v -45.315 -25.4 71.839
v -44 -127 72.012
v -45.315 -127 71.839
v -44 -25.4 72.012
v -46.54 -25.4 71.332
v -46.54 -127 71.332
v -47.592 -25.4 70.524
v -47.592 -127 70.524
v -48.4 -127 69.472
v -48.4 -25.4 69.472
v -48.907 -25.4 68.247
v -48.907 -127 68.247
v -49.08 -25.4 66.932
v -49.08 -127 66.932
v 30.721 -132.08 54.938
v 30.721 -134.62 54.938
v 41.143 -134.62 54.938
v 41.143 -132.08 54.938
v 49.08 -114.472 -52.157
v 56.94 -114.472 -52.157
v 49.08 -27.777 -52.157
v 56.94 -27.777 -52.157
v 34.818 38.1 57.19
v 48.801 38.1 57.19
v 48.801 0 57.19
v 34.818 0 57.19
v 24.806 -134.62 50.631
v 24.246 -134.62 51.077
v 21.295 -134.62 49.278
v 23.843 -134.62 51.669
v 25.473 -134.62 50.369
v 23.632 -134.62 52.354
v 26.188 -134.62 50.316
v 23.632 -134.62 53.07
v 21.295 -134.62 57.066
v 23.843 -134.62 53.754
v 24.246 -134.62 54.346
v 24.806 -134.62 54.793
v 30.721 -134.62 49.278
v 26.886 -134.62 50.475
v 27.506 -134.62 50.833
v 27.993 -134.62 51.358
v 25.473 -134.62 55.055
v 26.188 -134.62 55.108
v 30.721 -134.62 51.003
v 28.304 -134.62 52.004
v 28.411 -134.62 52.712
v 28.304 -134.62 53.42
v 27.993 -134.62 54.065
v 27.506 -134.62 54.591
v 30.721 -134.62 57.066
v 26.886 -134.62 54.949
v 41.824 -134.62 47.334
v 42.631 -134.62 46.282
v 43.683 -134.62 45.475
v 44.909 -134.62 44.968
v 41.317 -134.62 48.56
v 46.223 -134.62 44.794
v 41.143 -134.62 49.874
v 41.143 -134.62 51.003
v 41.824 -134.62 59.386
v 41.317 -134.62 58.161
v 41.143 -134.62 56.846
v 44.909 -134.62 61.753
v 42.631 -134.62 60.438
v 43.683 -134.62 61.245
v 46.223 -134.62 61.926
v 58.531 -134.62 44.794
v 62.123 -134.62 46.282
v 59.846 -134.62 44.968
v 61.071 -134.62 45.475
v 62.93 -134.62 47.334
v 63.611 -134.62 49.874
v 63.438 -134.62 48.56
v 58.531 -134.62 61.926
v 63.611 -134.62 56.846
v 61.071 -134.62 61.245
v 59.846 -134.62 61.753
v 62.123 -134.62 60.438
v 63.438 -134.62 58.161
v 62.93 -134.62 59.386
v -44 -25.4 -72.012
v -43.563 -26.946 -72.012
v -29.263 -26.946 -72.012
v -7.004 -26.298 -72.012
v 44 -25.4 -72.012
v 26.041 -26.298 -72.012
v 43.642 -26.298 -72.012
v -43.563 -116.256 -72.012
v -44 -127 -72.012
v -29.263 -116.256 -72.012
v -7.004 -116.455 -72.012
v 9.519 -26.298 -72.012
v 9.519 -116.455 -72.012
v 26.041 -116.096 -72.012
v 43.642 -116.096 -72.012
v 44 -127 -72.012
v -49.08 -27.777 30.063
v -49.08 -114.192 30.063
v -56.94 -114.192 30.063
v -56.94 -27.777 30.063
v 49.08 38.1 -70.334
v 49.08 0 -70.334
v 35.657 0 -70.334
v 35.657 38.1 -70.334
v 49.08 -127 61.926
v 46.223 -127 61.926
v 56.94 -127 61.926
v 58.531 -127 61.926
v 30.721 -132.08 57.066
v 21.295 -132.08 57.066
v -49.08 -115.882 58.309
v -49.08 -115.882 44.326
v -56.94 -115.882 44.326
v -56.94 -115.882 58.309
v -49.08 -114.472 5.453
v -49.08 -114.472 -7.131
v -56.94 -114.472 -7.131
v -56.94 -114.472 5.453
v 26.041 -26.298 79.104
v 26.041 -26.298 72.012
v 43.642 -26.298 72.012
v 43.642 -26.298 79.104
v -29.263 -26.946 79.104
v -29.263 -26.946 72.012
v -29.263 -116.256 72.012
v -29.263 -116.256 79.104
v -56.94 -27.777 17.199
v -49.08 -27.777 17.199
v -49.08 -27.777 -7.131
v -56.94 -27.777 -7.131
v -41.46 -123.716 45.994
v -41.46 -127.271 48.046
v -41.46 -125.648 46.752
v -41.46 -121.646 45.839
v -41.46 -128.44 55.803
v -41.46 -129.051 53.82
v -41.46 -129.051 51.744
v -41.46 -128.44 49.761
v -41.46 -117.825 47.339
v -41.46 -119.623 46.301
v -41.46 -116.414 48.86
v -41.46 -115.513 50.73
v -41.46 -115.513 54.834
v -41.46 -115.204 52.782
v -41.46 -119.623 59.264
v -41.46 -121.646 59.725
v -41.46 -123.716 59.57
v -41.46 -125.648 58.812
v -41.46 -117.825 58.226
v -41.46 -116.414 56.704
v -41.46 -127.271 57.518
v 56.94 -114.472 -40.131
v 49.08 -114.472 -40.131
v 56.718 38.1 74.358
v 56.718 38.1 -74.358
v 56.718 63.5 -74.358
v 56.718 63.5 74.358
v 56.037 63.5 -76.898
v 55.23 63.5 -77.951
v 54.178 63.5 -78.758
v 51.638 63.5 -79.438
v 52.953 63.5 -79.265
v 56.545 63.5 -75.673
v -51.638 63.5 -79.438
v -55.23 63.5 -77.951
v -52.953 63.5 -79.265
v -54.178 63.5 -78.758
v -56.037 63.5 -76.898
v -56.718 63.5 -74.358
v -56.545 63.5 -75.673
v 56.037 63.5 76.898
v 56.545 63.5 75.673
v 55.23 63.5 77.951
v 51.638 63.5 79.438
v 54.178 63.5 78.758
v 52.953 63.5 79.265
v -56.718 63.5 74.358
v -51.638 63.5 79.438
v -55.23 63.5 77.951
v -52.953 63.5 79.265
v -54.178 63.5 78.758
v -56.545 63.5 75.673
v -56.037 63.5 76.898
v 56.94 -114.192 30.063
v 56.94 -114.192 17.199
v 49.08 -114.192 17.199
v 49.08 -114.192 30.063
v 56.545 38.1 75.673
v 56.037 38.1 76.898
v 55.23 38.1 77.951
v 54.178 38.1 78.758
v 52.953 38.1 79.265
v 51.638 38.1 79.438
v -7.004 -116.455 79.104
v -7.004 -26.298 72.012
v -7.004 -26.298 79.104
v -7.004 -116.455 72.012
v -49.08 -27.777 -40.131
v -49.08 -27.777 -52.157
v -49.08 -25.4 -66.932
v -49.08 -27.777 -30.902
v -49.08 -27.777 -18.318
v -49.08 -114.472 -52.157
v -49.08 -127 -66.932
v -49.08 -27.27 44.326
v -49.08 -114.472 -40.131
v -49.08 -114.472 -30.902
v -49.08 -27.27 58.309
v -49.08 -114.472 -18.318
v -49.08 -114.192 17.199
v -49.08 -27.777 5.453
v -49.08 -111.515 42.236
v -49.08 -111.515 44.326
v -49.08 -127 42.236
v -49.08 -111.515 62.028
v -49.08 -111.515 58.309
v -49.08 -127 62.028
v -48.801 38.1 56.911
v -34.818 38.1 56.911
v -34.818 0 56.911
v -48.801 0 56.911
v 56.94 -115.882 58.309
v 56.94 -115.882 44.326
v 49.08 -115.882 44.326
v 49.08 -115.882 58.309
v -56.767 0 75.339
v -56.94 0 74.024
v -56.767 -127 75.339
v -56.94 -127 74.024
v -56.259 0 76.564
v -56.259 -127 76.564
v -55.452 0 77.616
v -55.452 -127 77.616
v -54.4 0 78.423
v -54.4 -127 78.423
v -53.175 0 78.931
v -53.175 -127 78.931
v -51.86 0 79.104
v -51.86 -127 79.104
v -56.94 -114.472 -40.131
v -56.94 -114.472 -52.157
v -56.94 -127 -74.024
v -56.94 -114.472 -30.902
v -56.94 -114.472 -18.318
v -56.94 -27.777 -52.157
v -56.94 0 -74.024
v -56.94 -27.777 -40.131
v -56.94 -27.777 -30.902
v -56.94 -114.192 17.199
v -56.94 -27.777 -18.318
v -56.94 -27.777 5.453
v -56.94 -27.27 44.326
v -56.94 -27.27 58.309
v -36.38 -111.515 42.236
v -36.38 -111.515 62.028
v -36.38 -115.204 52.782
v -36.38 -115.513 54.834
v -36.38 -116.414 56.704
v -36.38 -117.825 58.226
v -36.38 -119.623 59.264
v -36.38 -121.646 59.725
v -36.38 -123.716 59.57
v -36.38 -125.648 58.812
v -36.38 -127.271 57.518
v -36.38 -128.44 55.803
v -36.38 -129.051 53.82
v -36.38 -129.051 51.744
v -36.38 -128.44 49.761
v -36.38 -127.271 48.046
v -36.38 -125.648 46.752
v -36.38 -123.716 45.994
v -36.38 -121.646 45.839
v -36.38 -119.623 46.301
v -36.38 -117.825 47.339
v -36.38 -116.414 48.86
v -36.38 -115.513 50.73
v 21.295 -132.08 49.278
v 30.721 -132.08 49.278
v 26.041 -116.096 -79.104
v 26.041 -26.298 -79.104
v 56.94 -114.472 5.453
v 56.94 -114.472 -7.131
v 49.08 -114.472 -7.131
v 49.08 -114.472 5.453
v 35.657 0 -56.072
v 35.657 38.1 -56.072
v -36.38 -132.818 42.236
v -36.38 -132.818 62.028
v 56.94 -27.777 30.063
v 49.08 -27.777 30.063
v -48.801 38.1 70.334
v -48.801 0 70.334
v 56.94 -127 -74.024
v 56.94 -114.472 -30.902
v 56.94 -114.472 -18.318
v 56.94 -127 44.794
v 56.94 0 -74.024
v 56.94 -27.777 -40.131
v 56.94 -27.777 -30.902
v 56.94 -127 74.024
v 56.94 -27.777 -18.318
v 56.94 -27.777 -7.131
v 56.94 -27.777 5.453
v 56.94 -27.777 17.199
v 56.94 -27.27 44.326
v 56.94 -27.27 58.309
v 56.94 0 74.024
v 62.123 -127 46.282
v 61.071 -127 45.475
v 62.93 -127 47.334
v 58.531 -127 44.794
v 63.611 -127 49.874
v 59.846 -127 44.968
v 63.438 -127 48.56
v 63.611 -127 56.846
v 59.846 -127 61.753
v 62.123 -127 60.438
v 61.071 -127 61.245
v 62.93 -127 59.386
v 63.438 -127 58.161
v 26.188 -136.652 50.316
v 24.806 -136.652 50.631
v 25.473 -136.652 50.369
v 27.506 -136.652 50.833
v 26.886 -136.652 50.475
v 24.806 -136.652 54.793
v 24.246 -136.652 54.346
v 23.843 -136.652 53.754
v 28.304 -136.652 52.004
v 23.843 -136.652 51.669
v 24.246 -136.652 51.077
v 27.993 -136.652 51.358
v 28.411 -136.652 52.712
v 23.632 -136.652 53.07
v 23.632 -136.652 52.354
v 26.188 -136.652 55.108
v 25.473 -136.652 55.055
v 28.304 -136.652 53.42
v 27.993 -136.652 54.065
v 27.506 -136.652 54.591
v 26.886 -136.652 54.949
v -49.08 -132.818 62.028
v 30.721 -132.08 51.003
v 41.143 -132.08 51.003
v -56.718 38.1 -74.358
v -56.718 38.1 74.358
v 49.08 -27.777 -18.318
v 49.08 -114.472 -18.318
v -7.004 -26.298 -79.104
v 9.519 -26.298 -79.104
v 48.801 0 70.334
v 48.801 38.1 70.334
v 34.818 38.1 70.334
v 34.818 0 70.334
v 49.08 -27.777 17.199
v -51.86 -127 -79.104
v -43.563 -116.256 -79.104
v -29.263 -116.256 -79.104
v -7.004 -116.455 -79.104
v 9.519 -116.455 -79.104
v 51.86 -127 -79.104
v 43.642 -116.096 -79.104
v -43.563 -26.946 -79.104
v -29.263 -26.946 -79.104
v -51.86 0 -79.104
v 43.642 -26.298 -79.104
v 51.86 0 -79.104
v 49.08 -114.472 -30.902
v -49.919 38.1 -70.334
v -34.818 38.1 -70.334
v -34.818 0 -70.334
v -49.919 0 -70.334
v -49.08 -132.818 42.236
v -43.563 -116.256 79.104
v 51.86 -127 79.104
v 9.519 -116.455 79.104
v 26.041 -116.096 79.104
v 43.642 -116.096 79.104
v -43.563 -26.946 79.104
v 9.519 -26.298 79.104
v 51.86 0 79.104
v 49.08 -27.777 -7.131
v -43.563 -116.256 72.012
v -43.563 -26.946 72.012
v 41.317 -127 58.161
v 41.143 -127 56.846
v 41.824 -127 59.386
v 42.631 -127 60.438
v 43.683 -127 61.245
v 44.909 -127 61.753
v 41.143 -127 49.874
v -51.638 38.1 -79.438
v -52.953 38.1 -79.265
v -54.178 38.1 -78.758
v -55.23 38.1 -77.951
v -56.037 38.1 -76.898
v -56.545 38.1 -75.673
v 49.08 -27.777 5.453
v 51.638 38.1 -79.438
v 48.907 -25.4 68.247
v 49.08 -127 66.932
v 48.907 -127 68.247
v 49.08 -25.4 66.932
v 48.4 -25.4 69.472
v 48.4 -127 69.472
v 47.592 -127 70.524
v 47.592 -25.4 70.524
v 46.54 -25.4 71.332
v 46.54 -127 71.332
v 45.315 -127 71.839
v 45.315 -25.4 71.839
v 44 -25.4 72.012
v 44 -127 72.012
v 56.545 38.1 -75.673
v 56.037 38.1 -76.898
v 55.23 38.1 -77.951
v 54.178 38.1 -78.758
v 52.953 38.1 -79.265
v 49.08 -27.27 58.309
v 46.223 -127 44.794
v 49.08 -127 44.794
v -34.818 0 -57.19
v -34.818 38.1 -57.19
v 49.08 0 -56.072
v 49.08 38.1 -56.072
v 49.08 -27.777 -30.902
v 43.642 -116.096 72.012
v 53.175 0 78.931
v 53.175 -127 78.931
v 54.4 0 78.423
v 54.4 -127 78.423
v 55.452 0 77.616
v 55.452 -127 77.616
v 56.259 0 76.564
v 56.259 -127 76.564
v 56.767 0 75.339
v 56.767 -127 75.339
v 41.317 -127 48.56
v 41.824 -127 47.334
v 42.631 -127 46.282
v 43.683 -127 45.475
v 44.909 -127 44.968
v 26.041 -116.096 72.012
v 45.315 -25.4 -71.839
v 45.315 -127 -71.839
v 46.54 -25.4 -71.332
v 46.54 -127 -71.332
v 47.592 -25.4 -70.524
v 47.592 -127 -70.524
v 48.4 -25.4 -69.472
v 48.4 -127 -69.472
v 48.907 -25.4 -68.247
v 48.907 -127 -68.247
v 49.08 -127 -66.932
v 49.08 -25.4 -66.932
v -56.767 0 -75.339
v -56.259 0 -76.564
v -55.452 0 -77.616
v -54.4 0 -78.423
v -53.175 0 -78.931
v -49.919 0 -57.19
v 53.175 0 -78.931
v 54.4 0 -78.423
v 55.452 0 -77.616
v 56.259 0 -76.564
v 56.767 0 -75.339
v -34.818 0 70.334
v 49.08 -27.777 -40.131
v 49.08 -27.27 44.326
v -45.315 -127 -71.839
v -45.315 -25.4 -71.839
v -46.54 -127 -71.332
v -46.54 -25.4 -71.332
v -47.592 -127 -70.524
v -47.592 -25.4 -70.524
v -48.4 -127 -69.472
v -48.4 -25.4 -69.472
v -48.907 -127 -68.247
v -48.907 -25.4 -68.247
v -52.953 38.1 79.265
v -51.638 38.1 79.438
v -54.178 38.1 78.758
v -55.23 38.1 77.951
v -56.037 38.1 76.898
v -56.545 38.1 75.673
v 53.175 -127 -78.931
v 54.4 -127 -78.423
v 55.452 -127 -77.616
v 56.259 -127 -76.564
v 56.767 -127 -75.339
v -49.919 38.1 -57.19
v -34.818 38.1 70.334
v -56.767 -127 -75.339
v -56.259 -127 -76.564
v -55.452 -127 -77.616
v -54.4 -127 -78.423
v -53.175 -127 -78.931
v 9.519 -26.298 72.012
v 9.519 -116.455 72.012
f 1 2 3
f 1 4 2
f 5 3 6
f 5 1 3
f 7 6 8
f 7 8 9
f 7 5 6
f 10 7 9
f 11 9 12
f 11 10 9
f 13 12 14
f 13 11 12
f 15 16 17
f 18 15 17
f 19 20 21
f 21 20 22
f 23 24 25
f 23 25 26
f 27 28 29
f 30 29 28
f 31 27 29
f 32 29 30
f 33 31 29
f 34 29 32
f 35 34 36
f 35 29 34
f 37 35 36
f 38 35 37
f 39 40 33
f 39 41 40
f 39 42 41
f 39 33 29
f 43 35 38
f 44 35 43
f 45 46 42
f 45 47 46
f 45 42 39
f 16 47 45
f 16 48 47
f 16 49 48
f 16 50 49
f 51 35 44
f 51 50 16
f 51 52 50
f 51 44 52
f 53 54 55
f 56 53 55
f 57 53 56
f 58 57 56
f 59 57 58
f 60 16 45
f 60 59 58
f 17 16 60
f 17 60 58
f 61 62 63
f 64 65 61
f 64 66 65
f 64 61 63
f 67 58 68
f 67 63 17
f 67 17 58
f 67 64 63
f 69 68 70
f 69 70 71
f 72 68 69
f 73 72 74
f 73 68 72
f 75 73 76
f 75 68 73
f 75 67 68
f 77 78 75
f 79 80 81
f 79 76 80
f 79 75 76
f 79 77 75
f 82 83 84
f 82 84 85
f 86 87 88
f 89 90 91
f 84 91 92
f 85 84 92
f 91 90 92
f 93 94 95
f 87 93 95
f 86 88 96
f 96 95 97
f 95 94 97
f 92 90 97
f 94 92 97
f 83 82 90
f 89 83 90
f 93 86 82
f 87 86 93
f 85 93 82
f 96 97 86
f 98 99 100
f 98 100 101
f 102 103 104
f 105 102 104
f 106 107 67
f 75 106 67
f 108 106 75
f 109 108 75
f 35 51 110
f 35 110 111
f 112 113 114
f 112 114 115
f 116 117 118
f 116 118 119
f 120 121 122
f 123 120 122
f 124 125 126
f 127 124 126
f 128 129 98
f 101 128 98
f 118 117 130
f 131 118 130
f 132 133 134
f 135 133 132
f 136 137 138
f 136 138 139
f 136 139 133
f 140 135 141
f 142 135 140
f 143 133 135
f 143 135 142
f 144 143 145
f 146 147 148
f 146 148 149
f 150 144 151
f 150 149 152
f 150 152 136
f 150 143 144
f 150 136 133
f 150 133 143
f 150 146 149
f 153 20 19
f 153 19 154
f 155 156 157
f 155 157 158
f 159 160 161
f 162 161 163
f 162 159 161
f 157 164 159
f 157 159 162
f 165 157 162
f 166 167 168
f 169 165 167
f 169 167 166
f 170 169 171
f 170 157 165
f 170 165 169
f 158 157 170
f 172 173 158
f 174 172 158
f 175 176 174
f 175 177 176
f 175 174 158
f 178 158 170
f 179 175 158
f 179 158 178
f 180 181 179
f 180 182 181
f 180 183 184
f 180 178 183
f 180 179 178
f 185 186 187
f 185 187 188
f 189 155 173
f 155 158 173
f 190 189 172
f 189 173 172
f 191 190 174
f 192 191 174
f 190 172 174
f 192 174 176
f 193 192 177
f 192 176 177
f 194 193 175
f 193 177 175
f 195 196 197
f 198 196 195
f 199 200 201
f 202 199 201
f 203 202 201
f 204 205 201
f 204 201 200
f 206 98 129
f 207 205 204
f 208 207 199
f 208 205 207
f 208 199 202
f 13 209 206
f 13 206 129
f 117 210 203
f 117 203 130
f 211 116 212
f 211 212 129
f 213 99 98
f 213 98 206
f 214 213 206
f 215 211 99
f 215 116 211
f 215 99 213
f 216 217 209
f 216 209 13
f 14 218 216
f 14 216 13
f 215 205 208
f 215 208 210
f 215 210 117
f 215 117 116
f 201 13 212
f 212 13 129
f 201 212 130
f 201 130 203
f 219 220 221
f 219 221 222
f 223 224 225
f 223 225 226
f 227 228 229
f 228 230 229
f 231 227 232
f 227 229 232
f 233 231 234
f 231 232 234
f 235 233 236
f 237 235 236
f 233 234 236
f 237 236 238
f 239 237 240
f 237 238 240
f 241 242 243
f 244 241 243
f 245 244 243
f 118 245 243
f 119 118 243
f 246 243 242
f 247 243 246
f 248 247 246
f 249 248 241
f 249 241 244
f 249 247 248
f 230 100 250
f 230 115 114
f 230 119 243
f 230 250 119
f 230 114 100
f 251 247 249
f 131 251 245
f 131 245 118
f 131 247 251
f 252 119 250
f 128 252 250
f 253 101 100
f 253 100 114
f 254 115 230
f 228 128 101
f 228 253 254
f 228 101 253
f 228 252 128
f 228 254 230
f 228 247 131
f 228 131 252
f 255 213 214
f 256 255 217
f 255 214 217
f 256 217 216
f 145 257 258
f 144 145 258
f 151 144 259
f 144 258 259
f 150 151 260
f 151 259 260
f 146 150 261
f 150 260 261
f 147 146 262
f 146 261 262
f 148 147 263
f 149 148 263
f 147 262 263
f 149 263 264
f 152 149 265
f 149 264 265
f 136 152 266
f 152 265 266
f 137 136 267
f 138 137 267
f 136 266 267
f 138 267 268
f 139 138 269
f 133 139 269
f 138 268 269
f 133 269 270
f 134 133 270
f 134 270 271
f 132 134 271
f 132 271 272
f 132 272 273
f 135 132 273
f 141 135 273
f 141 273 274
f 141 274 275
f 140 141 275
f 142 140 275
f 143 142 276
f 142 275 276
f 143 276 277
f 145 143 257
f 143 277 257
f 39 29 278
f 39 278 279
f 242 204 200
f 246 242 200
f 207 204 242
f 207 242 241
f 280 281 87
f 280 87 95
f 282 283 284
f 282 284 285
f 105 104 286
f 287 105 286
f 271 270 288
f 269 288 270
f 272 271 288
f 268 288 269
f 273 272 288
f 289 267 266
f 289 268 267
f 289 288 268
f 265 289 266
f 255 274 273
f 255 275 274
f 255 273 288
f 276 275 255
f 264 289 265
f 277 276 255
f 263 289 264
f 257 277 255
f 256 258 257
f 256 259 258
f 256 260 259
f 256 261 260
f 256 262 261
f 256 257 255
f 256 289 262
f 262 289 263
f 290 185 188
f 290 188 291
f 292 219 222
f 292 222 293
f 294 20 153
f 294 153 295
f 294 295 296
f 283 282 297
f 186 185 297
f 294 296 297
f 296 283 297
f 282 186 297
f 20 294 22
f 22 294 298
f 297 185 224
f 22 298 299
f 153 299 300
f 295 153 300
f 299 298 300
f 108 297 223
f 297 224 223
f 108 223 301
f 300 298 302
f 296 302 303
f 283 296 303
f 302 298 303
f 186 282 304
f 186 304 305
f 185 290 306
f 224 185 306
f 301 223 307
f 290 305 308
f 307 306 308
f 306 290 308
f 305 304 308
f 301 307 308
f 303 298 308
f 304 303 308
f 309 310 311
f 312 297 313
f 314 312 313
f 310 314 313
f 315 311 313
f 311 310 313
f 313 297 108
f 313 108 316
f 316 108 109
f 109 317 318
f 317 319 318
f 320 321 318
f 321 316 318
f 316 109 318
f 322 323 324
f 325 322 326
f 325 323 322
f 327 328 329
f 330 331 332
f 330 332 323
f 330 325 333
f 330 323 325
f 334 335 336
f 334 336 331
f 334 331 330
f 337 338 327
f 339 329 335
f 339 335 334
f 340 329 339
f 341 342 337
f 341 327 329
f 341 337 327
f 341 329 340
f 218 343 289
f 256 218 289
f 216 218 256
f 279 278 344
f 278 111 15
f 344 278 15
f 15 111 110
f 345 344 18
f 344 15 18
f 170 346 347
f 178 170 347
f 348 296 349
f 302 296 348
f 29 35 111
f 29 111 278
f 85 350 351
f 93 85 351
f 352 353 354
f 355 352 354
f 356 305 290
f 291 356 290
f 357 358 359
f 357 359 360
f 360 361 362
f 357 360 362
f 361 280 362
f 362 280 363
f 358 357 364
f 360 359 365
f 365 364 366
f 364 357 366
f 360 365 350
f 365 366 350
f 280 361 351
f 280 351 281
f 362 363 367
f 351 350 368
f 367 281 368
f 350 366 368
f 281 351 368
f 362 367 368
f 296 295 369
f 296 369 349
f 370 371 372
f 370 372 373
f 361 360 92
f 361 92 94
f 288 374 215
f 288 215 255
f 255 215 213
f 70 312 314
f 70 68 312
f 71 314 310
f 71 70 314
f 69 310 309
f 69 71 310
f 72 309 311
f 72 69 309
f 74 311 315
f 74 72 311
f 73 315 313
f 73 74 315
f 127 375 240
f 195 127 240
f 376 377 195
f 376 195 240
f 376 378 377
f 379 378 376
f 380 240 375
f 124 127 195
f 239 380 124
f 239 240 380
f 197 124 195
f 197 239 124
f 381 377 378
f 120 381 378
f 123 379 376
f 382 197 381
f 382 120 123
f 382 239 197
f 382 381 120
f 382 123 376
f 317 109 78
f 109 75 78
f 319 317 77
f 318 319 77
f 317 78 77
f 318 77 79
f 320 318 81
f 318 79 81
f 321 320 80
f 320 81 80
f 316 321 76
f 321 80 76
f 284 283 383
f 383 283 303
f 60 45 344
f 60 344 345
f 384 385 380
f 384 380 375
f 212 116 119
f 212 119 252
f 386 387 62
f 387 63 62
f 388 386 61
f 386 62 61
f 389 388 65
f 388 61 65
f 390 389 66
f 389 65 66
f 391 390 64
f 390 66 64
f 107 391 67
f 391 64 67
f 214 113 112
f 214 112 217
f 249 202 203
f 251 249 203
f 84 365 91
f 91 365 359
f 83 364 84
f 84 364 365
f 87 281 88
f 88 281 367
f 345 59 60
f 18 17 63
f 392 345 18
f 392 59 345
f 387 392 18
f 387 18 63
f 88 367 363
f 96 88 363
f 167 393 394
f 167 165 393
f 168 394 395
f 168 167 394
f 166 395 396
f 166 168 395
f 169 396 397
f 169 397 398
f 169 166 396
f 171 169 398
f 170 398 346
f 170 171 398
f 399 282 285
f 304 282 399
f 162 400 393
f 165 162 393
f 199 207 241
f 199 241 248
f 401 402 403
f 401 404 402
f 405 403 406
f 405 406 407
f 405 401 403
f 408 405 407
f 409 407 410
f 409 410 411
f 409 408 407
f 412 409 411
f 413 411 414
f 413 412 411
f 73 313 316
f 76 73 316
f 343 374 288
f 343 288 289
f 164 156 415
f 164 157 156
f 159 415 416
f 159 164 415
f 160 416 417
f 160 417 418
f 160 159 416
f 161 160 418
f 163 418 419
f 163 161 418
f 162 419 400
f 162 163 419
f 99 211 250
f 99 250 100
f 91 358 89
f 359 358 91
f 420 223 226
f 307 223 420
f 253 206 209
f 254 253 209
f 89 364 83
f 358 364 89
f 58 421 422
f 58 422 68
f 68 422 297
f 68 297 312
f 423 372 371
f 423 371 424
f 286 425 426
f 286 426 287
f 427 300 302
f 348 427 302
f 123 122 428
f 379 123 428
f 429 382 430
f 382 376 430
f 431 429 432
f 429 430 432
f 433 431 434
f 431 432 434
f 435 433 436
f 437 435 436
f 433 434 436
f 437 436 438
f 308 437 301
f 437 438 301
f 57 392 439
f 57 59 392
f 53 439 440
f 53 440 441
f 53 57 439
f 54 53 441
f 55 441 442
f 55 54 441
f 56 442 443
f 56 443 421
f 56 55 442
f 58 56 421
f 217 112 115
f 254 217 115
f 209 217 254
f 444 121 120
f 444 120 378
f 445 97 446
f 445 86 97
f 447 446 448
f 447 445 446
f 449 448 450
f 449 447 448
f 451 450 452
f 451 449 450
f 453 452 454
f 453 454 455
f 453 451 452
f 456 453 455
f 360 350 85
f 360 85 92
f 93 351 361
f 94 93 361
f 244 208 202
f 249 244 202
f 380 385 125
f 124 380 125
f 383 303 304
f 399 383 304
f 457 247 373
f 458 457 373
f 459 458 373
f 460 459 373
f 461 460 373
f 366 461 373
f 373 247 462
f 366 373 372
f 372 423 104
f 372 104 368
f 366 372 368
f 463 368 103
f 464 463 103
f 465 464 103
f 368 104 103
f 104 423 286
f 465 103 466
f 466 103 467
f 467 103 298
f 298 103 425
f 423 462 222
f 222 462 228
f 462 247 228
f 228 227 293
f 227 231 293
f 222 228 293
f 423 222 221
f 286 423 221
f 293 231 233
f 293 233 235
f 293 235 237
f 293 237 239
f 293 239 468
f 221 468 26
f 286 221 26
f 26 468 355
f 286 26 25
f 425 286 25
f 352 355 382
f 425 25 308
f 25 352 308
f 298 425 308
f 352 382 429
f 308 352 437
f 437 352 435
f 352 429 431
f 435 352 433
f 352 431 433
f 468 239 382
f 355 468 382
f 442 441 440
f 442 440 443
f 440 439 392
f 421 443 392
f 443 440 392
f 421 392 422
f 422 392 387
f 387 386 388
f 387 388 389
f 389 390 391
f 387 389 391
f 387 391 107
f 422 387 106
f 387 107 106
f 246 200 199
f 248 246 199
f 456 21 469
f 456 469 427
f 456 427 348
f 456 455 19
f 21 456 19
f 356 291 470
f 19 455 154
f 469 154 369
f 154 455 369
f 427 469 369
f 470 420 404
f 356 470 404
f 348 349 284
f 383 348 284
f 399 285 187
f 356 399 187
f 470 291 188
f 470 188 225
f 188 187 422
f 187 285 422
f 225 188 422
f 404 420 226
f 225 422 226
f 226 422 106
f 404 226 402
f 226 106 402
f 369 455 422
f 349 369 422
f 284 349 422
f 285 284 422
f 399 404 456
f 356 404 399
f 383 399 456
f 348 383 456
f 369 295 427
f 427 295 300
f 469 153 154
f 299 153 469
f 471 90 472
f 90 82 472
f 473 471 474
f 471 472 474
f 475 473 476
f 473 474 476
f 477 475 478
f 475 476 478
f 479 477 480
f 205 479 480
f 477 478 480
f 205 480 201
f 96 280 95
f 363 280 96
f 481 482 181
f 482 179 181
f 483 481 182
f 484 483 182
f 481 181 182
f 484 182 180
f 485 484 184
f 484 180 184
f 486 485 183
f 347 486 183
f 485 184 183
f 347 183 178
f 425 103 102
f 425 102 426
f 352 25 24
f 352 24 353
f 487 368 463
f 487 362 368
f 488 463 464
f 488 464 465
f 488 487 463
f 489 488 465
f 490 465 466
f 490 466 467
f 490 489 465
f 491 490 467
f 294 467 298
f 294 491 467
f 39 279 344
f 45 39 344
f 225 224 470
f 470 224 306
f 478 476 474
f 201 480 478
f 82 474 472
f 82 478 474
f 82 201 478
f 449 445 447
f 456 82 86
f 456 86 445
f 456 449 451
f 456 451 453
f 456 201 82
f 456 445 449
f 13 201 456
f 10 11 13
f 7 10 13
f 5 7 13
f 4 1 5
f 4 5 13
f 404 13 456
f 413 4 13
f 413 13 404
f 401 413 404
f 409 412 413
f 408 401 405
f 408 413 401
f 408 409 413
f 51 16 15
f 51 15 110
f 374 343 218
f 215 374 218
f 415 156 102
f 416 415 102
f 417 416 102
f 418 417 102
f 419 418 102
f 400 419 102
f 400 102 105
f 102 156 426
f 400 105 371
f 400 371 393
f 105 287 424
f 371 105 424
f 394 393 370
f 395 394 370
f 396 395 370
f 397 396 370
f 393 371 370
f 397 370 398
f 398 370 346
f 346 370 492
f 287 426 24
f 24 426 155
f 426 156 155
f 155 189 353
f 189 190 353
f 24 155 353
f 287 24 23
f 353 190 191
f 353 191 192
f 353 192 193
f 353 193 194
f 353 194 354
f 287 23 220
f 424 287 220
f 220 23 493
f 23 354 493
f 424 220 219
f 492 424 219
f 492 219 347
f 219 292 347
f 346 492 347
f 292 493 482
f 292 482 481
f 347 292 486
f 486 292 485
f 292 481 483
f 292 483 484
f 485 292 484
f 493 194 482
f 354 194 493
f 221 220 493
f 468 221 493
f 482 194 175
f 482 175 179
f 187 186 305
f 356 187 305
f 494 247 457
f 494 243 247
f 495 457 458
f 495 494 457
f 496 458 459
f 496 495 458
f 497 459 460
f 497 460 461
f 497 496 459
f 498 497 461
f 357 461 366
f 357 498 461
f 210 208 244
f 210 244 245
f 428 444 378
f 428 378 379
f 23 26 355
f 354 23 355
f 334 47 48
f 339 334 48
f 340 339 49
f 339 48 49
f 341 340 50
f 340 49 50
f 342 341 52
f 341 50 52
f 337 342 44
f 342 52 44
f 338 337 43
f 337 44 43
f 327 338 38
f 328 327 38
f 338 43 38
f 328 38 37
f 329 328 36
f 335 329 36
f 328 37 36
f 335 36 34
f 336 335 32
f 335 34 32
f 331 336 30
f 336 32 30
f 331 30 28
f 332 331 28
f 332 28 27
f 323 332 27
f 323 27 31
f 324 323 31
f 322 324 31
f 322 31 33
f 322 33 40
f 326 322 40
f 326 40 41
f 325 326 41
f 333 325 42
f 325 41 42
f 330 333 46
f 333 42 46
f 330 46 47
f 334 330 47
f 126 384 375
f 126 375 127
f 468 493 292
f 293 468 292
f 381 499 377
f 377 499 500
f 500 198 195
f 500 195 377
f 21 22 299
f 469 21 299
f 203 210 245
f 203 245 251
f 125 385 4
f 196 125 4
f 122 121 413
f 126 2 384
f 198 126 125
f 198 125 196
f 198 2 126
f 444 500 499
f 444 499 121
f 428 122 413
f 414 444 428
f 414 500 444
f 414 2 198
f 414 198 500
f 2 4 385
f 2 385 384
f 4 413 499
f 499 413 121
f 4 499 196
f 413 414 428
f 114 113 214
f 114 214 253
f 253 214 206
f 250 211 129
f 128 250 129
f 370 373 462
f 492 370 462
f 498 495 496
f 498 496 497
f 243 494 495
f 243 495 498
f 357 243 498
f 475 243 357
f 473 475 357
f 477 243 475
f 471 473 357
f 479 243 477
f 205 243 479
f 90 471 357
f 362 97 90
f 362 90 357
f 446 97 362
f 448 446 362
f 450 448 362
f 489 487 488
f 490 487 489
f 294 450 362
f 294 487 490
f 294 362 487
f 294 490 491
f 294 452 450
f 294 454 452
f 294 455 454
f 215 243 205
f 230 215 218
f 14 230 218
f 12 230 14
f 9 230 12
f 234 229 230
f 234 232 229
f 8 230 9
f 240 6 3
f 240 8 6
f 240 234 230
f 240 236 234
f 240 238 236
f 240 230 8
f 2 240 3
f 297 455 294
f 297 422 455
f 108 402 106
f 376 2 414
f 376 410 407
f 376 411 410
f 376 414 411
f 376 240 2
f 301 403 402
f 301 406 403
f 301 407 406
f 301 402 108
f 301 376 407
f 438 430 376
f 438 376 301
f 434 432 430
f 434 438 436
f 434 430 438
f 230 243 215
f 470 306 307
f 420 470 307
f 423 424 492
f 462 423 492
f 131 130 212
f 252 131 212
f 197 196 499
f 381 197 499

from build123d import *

# Parameters (mm, degrees)
F0_W      = 113.8799723737
F0_H      = 158.2074281148
F1_DEPTH  = 127
F2_W      = 98.160520196
F2_H      = 144.0246999264
F3_DEPTH  = 101.6
F4_W      = 14.300648123
F4_H      = 89.3096532673
F5_DEPTH  = 158.2084281148
F6_W      = 16.5228282567
F6_H      = 90.1571717113
F7_DEPTH  = 158.2084281148
F8_W      = 17.6004189998
F8_H      = 89.7979792207
F9_DEPTH  = 158.2084281148
F10_W     = 88.6119194329
F10_H     = 13.9829851687
F11_DEPTH = 113.8809723737
F12_W     = 86.4148177207
F12_H     = 12.8643419594
F12_W_2   = 86.6944752634
F12_H_2   = 12.5846816227
F12_H_3   = 12.584682554
F12_H_4   = 12.025360018
F13_DEPTH = 113.8809723737
F14_R     = 5.08
F15_W     = 13.9829777181
F15_H     = 13.1440013647
F15_H_2   = 13.4236589074
F15_W_2   = 15.1016153395
F15_W_3   = 13.4236626327
F15_H_3   = 14.2626389861
F16_DEPTH = 38.1
F17_W     = 113.4359836578
F17_H     = 158.8768362999
F18_DEPTH = 25.4
F19_R     = 5.08
F20_W     = 22.4674493074
F20_H     = 17.1314254403
F21_DEPTH = 7.62
F22_R     = 5.08
F23_R     = 1.8874921425
F23_W     = 10.422969237
F23_H     = 3.9357170463
F23_W_2   = 1.3796649873
F24_DEPTH = 2.54
F25_R     = 2.4029253483
F26_DEPTH = 2.032
F27_W     = 21.3028490543
F27_H     = 19.792418927
F28_DEPTH = 12.7
F29_R     = 6.9626979342
F30_DEPTH = 5.08


with BuildPart() as f1:
    # F0 (on Front) → F1 (new body)
    with BuildSketch(Plane.XZ):
        Rectangle(F0_W, F0_H)
    extrude(amount=F1_DEPTH)

    # F2 (on face) → F3 (cut)
    with BuildSketch(Plane.XZ.offset(127)):
        Rectangle(F2_W, F2_H)
    extrude(amount=-F3_DEPTH, mode=Mode.SUBTRACT)

    # F4 (on face) → F5 (cut, through all)
    with BuildSketch(Plane(origin=(0, 0, -79.1037140574), x_dir=(1, 0, 0), z_dir=(0, 0, -1))):
        with Locations((-36.4129859954, 71.6007696465)):
            Rectangle(F4_W, F4_H)
    extrude(amount=-F5_DEPTH, mode=Mode.SUBTRACT)

    # F6 (on face) → F7 (cut, through all)
    with BuildSketch(Plane(origin=(0, 0, -79.1037140574), x_dir=(1, 0, 0), z_dir=(0, 0, -1))):
        with Locations((1.257171738, 71.3765667751)):
            Rectangle(F6_W, F6_H)
    extrude(amount=-F7_DEPTH, mode=Mode.SUBTRACT)

    # F8 (on face) → F9 (cut, through all)
    with BuildSketch(Plane(origin=(0, 0, -79.1037140574), x_dir=(1, 0, 0), z_dir=(0, 0, -1))):
        with Locations((34.8416222259, 71.1969705299)):
            Rectangle(F8_W, F8_H)
    extrude(amount=-F9_DEPTH, mode=Mode.SUBTRACT)

    # F10 (on face) → F11 (cut, through all)
    with BuildSketch(Plane.YZ.offset(56.9399861869)):
        with Locations((-71.5756770223, 51.3175372034)):
            Rectangle(F10_W, F10_H)
    extrude(amount=-F11_DEPTH, mode=Mode.SUBTRACT)

    # F12 (on face) → F13 (cut, through all)
    with BuildSketch(Plane.YZ.offset(56.9399861869)):
        with Locations((-70.9845181555, 23.6312365159)):
            Rectangle(F12_W, F12_H)
        with Locations((-71.1243469268, -0.8389786817)):
            Rectangle(F12_W_2, F12_H_2)
        with Locations((-71.1243469268, -24.6100444347)):
            Rectangle(F12_W_2, F12_H_3)
        with Locations((-71.1243469268, -46.1438354105)):
            Rectangle(F12_W_2, F12_H_4)
    extrude(amount=-F13_DEPTH, mode=Mode.SUBTRACT)

    # F14
    f14_edges = [f1.edges().sort_by_distance(p)[0] for p in [
        (56.939986, -63.5, -79.103714),
        (-56.939986, -63.5, -79.103714),
        (56.939986, -63.5, 79.103714),
        (-56.939986, -63.5, 79.103714),
        (49.08026, -76.2, 72.01235),
        (49.08026, -76.2, -72.01235),
        (-49.08026, -76.2, -72.01235),
        (-49.08026, -76.2, 72.01235),
    ]]
    fillet(f14_edges, radius=F14_R)

    # F15 (on face) → F16 (join)
    with BuildSketch(Plane(origin=(0, 0, 0), x_dir=(-1, 0, 0), z_dir=(0, 1, 0))):
        with Locations((-41.8091099709, 63.7623891234)):
            Rectangle(F15_W, F15_H)
        with Locations((41.8091099709, 63.6225603521)):
            Rectangle(F15_W, F15_H_2)
        with Locations((42.3684287816, -63.7623891234)):
            Rectangle(F15_W_2, F15_H)
        with Locations((-42.3684287816, -63.2030703127)):
            Rectangle(F15_W_3, F15_H_3)
    extrude(amount=F16_DEPTH)

    # F17 (on face) → F18 (join)
    with BuildSketch(Plane(origin=(0, 38.1, 0), x_dir=(-1, 0, 0), z_dir=(0, 1, 0))):
        Rectangle(F17_W, F17_H)
    extrude(amount=F18_DEPTH)

    # F19
    f19_edges = [f1.edges().sort_by_distance(p)[0] for p in [
        (-56.717992, 50.8, -79.438418),
        (56.717992, 50.8, -79.438418),
        (56.717992, 50.8, 79.438418),
        (-56.717992, 50.8, 79.438418),
    ]]
    fillet(f19_edges, radius=F19_R)

    # F20 (on face) → F21 (join)
    with BuildSketch(Plane.XZ.offset(127)):
        with Locations((52.3771941662, 53.3601529896)):
            Rectangle(F20_W, F20_H)
    extrude(amount=F21_DEPTH)

    # F22
    f22_edges = [f1.edges().sort_by_distance(p)[0] for p in [
        (63.610919, -130.81, 61.925866),
        (63.610919, -130.81, 44.79444),
        (41.14347, -130.81, 61.925866),
        (41.14347, -130.81, 44.79444),
    ]]
    fillet(f22_edges, radius=F22_R)

    # F23 (on face) → F24 (join)
    with BuildSketch(Plane.XZ.offset(134.62)):
        Polygon((29.3408352882, 51.0027073324), (29.3408352882, 54.9384243786), (30.7205002755, 54.9384243786), (30.7205002755, 57.0661351085), (21.2954226881, 57.0661351085), (21.2954226881, 49.2784120142), (30.7205002755, 49.2784120142), (30.7205002755, 51.0027073324), align=None)
        with Locations((25.4014916718, 52.5658614933)):
            Circle(F23_R, mode=Mode.SUBTRACT)
        with Locations((35.931984894, 52.9705658555)):
            Rectangle(F23_W, F23_H)
        with Locations((25.4014916718, 52.5658614933)):
            Circle(F23_R)
        with Locations((30.0306677818, 52.9705658555)):
            Rectangle(F23_W_2, F23_H)
    extrude(amount=-F24_DEPTH)

    # F25 (on face) → F26 (join)
    with BuildSketch(Plane.XZ.offset(134.62)):
        with Locations((26.0079614818, 52.7118705213)):
            Circle(F25_R)
    extrude(amount=F26_DEPTH)

    # F27 (on face) → F28 (join)
    with BuildSketch(Plane.YZ.offset(-49.080260098)):
        with Locations((-122.1664994955, 52.132261917)):
            Rectangle(F27_W, F27_H)
    extrude(amount=F28_DEPTH)

    # F29 (on face) → F30 (cut)
    with BuildSketch(Plane.YZ.offset(-36.380260098)):
        with Locations((-122.1664994955, 52.7822077274)):
            Circle(F29_R)
    extrude(amount=-F30_DEPTH, mode=Mode.SUBTRACT)


solid = f1.part
